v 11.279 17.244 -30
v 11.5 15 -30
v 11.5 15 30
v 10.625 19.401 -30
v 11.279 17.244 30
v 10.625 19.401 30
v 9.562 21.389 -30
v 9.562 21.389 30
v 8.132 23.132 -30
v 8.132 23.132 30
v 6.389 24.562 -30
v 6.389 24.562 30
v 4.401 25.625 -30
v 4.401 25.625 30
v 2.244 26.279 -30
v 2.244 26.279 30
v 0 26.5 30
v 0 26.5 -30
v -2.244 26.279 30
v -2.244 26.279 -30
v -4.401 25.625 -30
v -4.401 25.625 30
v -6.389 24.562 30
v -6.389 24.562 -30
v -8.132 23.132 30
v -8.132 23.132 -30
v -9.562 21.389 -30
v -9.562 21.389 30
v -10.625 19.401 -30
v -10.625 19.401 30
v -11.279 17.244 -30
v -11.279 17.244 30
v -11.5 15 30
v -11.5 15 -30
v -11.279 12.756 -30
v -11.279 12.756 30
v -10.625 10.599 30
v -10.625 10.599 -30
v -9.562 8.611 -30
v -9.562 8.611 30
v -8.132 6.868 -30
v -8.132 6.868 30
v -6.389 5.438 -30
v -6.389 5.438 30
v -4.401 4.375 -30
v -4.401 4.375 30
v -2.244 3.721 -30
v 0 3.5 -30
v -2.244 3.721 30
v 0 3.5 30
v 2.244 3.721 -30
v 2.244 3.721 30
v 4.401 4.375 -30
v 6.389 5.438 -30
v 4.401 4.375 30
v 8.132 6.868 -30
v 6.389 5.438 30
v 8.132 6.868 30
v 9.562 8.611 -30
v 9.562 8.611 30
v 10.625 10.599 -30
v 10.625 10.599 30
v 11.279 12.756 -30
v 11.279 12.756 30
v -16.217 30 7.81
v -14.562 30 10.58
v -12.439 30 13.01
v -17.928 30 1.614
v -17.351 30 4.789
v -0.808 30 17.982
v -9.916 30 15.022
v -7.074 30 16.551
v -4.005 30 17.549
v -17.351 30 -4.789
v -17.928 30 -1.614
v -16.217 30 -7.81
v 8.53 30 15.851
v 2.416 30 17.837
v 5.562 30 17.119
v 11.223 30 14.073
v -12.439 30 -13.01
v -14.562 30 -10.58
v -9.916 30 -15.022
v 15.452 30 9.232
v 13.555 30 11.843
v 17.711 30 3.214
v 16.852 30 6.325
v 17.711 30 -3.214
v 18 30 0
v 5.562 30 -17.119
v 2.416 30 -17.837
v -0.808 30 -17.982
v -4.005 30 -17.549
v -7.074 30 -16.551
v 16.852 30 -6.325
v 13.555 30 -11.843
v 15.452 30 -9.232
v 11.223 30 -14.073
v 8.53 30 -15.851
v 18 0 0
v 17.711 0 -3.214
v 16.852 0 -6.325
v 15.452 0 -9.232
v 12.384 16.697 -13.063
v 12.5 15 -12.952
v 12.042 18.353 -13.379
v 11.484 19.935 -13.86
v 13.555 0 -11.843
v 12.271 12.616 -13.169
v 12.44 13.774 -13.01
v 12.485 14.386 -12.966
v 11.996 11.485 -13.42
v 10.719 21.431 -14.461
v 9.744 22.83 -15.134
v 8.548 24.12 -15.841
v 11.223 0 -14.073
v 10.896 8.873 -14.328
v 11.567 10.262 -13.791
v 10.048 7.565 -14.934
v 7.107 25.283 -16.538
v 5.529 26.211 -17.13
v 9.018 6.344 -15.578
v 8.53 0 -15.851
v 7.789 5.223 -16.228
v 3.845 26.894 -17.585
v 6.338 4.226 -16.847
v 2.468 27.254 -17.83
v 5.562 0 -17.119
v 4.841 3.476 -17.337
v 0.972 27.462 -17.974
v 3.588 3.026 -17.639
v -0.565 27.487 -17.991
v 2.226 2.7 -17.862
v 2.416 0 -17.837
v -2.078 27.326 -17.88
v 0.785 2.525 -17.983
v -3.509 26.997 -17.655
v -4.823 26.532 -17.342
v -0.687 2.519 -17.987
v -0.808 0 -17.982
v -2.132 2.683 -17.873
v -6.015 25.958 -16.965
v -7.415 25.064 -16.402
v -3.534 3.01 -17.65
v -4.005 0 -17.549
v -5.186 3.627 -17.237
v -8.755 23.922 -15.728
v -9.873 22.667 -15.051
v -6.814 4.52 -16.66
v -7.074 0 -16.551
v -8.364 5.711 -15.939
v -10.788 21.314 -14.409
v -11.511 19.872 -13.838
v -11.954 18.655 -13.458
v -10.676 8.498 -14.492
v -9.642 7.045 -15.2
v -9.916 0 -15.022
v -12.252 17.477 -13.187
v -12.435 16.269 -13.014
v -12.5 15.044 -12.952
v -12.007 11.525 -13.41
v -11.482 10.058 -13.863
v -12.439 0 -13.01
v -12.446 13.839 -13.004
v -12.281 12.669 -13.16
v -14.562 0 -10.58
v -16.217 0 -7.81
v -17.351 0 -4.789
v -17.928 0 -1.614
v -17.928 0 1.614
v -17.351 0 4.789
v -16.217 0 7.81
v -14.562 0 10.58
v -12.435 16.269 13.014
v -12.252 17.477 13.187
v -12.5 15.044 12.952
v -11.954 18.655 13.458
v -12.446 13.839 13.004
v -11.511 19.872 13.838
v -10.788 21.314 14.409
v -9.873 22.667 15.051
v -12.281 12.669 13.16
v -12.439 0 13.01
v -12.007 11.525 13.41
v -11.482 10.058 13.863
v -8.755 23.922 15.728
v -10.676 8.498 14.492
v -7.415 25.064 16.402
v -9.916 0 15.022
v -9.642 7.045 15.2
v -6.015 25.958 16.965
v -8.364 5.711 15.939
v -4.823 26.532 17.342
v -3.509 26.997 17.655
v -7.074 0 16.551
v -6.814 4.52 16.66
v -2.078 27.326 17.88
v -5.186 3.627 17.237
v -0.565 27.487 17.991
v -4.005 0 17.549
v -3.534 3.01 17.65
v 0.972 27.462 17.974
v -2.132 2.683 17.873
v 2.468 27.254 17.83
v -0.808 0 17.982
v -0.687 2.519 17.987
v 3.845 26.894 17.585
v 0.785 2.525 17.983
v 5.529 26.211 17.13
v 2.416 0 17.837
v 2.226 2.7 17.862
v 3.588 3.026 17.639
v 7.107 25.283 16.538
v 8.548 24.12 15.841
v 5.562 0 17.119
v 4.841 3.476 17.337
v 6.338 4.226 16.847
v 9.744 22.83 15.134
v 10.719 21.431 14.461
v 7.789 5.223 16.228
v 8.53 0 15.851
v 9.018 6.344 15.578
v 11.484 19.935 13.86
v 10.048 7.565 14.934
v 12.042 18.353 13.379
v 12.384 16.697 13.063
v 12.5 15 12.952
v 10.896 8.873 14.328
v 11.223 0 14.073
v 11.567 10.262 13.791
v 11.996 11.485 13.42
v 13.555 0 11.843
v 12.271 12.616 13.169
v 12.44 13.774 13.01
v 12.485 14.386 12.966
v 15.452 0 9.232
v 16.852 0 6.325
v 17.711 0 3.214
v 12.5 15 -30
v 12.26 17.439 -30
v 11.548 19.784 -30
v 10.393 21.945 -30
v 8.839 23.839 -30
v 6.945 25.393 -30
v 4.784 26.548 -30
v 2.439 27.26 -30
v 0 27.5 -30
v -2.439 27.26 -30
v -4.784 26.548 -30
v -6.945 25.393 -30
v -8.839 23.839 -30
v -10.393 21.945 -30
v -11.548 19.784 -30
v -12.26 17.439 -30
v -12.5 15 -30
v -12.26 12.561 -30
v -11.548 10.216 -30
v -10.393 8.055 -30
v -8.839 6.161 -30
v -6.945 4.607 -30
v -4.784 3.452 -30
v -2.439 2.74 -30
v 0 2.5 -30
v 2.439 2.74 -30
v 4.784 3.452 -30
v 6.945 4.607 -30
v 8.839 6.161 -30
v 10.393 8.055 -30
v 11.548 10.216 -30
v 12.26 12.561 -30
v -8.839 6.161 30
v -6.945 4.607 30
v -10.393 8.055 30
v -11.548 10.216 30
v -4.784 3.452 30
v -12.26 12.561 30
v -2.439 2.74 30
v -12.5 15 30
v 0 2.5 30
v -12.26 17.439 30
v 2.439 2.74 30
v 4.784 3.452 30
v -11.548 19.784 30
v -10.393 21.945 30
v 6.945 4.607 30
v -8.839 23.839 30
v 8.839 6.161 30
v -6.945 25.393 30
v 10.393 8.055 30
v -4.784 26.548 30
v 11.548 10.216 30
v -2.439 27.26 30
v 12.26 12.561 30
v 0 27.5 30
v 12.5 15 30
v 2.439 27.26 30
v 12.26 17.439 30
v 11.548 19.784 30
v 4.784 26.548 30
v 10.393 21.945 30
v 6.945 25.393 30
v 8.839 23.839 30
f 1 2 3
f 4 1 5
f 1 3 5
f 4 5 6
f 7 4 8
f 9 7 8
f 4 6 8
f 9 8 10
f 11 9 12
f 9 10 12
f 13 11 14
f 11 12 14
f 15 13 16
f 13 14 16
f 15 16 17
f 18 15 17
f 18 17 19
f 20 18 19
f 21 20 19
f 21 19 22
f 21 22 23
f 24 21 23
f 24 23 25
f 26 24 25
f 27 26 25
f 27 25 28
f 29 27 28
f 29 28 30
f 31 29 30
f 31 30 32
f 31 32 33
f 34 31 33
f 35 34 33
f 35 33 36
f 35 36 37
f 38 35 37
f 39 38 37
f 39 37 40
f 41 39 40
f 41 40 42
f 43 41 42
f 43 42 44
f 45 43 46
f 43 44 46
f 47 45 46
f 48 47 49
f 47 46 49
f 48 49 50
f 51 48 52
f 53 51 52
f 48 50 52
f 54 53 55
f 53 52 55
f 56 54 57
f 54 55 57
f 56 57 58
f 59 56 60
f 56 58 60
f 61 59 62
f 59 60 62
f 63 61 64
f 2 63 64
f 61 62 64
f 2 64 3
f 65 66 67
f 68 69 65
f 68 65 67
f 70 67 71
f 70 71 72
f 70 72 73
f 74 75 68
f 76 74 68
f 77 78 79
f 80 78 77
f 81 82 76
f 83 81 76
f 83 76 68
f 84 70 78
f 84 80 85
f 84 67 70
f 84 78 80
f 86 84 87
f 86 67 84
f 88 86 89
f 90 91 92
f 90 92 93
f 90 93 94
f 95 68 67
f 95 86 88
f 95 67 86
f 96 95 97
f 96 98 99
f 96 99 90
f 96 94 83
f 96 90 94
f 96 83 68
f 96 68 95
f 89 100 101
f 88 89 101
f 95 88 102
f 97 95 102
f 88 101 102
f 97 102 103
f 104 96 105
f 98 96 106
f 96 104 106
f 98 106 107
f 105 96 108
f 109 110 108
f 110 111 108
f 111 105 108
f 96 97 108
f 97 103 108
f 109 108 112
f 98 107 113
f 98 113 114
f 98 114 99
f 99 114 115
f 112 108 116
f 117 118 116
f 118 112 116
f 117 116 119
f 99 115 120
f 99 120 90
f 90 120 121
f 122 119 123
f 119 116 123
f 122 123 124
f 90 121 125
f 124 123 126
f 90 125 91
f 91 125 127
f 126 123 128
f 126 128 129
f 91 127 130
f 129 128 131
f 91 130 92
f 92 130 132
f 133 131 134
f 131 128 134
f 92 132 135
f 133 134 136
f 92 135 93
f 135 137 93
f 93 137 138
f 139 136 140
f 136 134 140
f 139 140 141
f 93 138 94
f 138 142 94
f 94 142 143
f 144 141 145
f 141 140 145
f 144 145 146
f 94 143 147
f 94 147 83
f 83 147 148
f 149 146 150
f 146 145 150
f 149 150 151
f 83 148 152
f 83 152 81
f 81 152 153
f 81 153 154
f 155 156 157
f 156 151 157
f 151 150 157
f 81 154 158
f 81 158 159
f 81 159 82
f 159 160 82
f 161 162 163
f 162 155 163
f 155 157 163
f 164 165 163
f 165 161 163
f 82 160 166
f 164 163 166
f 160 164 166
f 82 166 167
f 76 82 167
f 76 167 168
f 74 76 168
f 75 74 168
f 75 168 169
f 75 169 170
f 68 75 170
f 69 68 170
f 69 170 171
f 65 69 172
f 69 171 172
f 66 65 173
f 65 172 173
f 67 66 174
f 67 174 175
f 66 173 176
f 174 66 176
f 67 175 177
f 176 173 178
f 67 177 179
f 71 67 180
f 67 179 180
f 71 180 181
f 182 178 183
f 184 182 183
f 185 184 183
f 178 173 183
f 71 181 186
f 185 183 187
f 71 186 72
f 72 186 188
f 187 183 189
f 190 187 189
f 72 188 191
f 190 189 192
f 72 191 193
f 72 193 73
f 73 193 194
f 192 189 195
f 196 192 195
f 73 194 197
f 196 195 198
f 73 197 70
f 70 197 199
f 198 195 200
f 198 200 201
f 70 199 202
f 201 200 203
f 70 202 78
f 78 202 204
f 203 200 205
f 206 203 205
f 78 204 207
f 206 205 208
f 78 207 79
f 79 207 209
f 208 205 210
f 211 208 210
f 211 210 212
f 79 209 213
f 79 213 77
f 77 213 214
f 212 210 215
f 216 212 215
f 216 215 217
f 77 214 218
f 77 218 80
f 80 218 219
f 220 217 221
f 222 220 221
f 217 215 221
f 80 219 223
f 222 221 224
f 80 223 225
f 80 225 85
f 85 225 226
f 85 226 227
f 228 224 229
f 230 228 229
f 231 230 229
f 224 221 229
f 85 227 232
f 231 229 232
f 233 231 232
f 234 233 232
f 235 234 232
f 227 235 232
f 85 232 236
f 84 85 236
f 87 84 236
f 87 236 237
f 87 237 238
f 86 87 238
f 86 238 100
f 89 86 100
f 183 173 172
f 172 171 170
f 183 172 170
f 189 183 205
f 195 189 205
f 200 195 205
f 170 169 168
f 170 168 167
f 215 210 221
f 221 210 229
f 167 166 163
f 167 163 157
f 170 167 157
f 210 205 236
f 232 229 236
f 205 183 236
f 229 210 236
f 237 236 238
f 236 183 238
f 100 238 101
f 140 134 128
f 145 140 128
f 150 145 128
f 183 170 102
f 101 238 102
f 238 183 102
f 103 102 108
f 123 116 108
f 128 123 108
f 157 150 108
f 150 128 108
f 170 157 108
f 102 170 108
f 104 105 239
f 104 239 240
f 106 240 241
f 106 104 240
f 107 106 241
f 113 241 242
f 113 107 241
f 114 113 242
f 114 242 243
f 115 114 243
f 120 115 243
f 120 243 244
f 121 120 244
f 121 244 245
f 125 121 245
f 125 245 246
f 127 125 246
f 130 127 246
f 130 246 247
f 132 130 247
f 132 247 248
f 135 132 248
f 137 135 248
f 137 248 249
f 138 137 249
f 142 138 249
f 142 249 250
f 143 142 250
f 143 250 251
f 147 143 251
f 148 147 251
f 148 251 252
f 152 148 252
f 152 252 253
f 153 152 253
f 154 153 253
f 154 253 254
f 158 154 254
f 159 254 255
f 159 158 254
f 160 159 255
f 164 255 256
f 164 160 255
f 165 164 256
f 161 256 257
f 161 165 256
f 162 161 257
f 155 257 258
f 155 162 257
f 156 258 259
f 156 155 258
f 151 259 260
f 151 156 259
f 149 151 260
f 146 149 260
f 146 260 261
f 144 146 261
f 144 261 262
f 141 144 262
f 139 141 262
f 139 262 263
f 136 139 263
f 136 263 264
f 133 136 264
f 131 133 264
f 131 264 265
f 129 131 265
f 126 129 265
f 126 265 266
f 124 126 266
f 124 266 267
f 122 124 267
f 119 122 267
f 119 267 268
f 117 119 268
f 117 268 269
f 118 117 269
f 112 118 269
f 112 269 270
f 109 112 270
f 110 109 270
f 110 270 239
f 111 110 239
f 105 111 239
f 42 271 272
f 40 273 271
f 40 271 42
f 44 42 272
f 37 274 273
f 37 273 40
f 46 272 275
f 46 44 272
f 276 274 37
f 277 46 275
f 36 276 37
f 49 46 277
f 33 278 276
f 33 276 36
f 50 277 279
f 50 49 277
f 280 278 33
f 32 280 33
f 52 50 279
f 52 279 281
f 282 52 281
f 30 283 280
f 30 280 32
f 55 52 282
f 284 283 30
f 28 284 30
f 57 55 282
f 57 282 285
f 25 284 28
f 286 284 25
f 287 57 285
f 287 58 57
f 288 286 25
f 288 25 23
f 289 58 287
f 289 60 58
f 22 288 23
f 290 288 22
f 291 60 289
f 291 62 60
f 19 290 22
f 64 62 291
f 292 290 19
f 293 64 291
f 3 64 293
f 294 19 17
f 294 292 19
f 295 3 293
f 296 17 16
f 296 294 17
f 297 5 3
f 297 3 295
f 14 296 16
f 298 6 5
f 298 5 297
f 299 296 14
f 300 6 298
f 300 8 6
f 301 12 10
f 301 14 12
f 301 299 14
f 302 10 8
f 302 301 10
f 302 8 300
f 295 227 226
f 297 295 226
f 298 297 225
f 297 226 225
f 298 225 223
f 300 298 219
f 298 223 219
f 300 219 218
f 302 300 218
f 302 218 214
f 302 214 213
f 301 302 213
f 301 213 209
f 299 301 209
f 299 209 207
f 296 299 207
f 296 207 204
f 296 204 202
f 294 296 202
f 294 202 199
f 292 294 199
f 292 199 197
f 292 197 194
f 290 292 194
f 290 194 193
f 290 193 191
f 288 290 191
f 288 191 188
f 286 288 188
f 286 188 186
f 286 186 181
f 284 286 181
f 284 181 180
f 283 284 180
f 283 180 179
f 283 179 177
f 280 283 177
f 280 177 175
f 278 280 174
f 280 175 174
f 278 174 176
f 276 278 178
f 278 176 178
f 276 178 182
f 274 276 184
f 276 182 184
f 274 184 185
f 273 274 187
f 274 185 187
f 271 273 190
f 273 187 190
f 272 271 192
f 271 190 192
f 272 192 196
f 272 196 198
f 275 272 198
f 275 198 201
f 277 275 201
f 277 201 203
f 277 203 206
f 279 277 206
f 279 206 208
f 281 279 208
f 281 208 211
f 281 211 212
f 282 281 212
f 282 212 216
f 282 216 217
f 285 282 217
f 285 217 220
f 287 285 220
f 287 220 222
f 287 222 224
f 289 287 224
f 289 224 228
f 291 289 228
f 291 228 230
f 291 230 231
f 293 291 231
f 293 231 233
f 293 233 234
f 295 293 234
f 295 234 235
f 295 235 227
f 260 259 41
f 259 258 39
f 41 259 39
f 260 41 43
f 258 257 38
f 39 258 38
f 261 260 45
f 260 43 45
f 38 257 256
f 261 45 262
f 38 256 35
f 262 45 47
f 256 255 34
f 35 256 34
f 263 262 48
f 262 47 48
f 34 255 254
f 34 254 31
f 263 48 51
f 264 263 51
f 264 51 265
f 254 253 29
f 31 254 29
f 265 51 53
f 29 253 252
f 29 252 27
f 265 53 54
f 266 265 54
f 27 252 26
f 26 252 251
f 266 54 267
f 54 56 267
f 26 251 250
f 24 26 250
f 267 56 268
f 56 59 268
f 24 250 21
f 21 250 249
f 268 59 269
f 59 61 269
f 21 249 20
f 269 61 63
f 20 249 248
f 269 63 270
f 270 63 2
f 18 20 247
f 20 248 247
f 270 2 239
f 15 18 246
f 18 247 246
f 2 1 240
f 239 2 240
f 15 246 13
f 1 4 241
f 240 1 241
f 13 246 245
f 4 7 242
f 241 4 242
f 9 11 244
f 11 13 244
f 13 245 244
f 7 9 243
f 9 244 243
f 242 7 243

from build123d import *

# Parameters (mm, degrees)
SKETCH1_R                = 18
BOSS_EXTRUDE1_DEPTH      = 30
BOSS_EXTRUDE2_DEPTH      = 30
BOSS_EXTRUDE2_DEPTH_BACK = 30
SKETCH2_R                = 12.5
SKETCH3_R                = 11.5
CUT_EXTRUDE1_DEPTH       = 70.455021572


with BuildPart() as part:
    # Sketch1 → Boss-Extrude1 (new body)
    with BuildSketch(Plane(origin=(0, 0, 0), x_dir=(1, 0, 0), z_dir=(0, 1, 0))):
        Circle(SKETCH1_R)
    extrude(amount=BOSS_EXTRUDE1_DEPTH)

    # Sketch2 → Boss-Extrude2 (add, two sides: drawn at the far end of the back side and taken through both)
    with BuildSketch(Plane.XY.offset(-BOSS_EXTRUDE2_DEPTH_BACK)):
        with Locations((0, 15)):
            Circle(SKETCH2_R)
    extrude(amount=BOSS_EXTRUDE2_DEPTH + BOSS_EXTRUDE2_DEPTH_BACK)

    # Sketch3 → Cut-Extrude1 (cut, through all)
    with BuildSketch(Plane.XY.offset(30)):
        with Locations((0, 15)):
            Circle(SKETCH3_R)
    extrude(amount=-CUT_EXTRUDE1_DEPTH, mode=Mode.SUBTRACT)


solid = part.part
